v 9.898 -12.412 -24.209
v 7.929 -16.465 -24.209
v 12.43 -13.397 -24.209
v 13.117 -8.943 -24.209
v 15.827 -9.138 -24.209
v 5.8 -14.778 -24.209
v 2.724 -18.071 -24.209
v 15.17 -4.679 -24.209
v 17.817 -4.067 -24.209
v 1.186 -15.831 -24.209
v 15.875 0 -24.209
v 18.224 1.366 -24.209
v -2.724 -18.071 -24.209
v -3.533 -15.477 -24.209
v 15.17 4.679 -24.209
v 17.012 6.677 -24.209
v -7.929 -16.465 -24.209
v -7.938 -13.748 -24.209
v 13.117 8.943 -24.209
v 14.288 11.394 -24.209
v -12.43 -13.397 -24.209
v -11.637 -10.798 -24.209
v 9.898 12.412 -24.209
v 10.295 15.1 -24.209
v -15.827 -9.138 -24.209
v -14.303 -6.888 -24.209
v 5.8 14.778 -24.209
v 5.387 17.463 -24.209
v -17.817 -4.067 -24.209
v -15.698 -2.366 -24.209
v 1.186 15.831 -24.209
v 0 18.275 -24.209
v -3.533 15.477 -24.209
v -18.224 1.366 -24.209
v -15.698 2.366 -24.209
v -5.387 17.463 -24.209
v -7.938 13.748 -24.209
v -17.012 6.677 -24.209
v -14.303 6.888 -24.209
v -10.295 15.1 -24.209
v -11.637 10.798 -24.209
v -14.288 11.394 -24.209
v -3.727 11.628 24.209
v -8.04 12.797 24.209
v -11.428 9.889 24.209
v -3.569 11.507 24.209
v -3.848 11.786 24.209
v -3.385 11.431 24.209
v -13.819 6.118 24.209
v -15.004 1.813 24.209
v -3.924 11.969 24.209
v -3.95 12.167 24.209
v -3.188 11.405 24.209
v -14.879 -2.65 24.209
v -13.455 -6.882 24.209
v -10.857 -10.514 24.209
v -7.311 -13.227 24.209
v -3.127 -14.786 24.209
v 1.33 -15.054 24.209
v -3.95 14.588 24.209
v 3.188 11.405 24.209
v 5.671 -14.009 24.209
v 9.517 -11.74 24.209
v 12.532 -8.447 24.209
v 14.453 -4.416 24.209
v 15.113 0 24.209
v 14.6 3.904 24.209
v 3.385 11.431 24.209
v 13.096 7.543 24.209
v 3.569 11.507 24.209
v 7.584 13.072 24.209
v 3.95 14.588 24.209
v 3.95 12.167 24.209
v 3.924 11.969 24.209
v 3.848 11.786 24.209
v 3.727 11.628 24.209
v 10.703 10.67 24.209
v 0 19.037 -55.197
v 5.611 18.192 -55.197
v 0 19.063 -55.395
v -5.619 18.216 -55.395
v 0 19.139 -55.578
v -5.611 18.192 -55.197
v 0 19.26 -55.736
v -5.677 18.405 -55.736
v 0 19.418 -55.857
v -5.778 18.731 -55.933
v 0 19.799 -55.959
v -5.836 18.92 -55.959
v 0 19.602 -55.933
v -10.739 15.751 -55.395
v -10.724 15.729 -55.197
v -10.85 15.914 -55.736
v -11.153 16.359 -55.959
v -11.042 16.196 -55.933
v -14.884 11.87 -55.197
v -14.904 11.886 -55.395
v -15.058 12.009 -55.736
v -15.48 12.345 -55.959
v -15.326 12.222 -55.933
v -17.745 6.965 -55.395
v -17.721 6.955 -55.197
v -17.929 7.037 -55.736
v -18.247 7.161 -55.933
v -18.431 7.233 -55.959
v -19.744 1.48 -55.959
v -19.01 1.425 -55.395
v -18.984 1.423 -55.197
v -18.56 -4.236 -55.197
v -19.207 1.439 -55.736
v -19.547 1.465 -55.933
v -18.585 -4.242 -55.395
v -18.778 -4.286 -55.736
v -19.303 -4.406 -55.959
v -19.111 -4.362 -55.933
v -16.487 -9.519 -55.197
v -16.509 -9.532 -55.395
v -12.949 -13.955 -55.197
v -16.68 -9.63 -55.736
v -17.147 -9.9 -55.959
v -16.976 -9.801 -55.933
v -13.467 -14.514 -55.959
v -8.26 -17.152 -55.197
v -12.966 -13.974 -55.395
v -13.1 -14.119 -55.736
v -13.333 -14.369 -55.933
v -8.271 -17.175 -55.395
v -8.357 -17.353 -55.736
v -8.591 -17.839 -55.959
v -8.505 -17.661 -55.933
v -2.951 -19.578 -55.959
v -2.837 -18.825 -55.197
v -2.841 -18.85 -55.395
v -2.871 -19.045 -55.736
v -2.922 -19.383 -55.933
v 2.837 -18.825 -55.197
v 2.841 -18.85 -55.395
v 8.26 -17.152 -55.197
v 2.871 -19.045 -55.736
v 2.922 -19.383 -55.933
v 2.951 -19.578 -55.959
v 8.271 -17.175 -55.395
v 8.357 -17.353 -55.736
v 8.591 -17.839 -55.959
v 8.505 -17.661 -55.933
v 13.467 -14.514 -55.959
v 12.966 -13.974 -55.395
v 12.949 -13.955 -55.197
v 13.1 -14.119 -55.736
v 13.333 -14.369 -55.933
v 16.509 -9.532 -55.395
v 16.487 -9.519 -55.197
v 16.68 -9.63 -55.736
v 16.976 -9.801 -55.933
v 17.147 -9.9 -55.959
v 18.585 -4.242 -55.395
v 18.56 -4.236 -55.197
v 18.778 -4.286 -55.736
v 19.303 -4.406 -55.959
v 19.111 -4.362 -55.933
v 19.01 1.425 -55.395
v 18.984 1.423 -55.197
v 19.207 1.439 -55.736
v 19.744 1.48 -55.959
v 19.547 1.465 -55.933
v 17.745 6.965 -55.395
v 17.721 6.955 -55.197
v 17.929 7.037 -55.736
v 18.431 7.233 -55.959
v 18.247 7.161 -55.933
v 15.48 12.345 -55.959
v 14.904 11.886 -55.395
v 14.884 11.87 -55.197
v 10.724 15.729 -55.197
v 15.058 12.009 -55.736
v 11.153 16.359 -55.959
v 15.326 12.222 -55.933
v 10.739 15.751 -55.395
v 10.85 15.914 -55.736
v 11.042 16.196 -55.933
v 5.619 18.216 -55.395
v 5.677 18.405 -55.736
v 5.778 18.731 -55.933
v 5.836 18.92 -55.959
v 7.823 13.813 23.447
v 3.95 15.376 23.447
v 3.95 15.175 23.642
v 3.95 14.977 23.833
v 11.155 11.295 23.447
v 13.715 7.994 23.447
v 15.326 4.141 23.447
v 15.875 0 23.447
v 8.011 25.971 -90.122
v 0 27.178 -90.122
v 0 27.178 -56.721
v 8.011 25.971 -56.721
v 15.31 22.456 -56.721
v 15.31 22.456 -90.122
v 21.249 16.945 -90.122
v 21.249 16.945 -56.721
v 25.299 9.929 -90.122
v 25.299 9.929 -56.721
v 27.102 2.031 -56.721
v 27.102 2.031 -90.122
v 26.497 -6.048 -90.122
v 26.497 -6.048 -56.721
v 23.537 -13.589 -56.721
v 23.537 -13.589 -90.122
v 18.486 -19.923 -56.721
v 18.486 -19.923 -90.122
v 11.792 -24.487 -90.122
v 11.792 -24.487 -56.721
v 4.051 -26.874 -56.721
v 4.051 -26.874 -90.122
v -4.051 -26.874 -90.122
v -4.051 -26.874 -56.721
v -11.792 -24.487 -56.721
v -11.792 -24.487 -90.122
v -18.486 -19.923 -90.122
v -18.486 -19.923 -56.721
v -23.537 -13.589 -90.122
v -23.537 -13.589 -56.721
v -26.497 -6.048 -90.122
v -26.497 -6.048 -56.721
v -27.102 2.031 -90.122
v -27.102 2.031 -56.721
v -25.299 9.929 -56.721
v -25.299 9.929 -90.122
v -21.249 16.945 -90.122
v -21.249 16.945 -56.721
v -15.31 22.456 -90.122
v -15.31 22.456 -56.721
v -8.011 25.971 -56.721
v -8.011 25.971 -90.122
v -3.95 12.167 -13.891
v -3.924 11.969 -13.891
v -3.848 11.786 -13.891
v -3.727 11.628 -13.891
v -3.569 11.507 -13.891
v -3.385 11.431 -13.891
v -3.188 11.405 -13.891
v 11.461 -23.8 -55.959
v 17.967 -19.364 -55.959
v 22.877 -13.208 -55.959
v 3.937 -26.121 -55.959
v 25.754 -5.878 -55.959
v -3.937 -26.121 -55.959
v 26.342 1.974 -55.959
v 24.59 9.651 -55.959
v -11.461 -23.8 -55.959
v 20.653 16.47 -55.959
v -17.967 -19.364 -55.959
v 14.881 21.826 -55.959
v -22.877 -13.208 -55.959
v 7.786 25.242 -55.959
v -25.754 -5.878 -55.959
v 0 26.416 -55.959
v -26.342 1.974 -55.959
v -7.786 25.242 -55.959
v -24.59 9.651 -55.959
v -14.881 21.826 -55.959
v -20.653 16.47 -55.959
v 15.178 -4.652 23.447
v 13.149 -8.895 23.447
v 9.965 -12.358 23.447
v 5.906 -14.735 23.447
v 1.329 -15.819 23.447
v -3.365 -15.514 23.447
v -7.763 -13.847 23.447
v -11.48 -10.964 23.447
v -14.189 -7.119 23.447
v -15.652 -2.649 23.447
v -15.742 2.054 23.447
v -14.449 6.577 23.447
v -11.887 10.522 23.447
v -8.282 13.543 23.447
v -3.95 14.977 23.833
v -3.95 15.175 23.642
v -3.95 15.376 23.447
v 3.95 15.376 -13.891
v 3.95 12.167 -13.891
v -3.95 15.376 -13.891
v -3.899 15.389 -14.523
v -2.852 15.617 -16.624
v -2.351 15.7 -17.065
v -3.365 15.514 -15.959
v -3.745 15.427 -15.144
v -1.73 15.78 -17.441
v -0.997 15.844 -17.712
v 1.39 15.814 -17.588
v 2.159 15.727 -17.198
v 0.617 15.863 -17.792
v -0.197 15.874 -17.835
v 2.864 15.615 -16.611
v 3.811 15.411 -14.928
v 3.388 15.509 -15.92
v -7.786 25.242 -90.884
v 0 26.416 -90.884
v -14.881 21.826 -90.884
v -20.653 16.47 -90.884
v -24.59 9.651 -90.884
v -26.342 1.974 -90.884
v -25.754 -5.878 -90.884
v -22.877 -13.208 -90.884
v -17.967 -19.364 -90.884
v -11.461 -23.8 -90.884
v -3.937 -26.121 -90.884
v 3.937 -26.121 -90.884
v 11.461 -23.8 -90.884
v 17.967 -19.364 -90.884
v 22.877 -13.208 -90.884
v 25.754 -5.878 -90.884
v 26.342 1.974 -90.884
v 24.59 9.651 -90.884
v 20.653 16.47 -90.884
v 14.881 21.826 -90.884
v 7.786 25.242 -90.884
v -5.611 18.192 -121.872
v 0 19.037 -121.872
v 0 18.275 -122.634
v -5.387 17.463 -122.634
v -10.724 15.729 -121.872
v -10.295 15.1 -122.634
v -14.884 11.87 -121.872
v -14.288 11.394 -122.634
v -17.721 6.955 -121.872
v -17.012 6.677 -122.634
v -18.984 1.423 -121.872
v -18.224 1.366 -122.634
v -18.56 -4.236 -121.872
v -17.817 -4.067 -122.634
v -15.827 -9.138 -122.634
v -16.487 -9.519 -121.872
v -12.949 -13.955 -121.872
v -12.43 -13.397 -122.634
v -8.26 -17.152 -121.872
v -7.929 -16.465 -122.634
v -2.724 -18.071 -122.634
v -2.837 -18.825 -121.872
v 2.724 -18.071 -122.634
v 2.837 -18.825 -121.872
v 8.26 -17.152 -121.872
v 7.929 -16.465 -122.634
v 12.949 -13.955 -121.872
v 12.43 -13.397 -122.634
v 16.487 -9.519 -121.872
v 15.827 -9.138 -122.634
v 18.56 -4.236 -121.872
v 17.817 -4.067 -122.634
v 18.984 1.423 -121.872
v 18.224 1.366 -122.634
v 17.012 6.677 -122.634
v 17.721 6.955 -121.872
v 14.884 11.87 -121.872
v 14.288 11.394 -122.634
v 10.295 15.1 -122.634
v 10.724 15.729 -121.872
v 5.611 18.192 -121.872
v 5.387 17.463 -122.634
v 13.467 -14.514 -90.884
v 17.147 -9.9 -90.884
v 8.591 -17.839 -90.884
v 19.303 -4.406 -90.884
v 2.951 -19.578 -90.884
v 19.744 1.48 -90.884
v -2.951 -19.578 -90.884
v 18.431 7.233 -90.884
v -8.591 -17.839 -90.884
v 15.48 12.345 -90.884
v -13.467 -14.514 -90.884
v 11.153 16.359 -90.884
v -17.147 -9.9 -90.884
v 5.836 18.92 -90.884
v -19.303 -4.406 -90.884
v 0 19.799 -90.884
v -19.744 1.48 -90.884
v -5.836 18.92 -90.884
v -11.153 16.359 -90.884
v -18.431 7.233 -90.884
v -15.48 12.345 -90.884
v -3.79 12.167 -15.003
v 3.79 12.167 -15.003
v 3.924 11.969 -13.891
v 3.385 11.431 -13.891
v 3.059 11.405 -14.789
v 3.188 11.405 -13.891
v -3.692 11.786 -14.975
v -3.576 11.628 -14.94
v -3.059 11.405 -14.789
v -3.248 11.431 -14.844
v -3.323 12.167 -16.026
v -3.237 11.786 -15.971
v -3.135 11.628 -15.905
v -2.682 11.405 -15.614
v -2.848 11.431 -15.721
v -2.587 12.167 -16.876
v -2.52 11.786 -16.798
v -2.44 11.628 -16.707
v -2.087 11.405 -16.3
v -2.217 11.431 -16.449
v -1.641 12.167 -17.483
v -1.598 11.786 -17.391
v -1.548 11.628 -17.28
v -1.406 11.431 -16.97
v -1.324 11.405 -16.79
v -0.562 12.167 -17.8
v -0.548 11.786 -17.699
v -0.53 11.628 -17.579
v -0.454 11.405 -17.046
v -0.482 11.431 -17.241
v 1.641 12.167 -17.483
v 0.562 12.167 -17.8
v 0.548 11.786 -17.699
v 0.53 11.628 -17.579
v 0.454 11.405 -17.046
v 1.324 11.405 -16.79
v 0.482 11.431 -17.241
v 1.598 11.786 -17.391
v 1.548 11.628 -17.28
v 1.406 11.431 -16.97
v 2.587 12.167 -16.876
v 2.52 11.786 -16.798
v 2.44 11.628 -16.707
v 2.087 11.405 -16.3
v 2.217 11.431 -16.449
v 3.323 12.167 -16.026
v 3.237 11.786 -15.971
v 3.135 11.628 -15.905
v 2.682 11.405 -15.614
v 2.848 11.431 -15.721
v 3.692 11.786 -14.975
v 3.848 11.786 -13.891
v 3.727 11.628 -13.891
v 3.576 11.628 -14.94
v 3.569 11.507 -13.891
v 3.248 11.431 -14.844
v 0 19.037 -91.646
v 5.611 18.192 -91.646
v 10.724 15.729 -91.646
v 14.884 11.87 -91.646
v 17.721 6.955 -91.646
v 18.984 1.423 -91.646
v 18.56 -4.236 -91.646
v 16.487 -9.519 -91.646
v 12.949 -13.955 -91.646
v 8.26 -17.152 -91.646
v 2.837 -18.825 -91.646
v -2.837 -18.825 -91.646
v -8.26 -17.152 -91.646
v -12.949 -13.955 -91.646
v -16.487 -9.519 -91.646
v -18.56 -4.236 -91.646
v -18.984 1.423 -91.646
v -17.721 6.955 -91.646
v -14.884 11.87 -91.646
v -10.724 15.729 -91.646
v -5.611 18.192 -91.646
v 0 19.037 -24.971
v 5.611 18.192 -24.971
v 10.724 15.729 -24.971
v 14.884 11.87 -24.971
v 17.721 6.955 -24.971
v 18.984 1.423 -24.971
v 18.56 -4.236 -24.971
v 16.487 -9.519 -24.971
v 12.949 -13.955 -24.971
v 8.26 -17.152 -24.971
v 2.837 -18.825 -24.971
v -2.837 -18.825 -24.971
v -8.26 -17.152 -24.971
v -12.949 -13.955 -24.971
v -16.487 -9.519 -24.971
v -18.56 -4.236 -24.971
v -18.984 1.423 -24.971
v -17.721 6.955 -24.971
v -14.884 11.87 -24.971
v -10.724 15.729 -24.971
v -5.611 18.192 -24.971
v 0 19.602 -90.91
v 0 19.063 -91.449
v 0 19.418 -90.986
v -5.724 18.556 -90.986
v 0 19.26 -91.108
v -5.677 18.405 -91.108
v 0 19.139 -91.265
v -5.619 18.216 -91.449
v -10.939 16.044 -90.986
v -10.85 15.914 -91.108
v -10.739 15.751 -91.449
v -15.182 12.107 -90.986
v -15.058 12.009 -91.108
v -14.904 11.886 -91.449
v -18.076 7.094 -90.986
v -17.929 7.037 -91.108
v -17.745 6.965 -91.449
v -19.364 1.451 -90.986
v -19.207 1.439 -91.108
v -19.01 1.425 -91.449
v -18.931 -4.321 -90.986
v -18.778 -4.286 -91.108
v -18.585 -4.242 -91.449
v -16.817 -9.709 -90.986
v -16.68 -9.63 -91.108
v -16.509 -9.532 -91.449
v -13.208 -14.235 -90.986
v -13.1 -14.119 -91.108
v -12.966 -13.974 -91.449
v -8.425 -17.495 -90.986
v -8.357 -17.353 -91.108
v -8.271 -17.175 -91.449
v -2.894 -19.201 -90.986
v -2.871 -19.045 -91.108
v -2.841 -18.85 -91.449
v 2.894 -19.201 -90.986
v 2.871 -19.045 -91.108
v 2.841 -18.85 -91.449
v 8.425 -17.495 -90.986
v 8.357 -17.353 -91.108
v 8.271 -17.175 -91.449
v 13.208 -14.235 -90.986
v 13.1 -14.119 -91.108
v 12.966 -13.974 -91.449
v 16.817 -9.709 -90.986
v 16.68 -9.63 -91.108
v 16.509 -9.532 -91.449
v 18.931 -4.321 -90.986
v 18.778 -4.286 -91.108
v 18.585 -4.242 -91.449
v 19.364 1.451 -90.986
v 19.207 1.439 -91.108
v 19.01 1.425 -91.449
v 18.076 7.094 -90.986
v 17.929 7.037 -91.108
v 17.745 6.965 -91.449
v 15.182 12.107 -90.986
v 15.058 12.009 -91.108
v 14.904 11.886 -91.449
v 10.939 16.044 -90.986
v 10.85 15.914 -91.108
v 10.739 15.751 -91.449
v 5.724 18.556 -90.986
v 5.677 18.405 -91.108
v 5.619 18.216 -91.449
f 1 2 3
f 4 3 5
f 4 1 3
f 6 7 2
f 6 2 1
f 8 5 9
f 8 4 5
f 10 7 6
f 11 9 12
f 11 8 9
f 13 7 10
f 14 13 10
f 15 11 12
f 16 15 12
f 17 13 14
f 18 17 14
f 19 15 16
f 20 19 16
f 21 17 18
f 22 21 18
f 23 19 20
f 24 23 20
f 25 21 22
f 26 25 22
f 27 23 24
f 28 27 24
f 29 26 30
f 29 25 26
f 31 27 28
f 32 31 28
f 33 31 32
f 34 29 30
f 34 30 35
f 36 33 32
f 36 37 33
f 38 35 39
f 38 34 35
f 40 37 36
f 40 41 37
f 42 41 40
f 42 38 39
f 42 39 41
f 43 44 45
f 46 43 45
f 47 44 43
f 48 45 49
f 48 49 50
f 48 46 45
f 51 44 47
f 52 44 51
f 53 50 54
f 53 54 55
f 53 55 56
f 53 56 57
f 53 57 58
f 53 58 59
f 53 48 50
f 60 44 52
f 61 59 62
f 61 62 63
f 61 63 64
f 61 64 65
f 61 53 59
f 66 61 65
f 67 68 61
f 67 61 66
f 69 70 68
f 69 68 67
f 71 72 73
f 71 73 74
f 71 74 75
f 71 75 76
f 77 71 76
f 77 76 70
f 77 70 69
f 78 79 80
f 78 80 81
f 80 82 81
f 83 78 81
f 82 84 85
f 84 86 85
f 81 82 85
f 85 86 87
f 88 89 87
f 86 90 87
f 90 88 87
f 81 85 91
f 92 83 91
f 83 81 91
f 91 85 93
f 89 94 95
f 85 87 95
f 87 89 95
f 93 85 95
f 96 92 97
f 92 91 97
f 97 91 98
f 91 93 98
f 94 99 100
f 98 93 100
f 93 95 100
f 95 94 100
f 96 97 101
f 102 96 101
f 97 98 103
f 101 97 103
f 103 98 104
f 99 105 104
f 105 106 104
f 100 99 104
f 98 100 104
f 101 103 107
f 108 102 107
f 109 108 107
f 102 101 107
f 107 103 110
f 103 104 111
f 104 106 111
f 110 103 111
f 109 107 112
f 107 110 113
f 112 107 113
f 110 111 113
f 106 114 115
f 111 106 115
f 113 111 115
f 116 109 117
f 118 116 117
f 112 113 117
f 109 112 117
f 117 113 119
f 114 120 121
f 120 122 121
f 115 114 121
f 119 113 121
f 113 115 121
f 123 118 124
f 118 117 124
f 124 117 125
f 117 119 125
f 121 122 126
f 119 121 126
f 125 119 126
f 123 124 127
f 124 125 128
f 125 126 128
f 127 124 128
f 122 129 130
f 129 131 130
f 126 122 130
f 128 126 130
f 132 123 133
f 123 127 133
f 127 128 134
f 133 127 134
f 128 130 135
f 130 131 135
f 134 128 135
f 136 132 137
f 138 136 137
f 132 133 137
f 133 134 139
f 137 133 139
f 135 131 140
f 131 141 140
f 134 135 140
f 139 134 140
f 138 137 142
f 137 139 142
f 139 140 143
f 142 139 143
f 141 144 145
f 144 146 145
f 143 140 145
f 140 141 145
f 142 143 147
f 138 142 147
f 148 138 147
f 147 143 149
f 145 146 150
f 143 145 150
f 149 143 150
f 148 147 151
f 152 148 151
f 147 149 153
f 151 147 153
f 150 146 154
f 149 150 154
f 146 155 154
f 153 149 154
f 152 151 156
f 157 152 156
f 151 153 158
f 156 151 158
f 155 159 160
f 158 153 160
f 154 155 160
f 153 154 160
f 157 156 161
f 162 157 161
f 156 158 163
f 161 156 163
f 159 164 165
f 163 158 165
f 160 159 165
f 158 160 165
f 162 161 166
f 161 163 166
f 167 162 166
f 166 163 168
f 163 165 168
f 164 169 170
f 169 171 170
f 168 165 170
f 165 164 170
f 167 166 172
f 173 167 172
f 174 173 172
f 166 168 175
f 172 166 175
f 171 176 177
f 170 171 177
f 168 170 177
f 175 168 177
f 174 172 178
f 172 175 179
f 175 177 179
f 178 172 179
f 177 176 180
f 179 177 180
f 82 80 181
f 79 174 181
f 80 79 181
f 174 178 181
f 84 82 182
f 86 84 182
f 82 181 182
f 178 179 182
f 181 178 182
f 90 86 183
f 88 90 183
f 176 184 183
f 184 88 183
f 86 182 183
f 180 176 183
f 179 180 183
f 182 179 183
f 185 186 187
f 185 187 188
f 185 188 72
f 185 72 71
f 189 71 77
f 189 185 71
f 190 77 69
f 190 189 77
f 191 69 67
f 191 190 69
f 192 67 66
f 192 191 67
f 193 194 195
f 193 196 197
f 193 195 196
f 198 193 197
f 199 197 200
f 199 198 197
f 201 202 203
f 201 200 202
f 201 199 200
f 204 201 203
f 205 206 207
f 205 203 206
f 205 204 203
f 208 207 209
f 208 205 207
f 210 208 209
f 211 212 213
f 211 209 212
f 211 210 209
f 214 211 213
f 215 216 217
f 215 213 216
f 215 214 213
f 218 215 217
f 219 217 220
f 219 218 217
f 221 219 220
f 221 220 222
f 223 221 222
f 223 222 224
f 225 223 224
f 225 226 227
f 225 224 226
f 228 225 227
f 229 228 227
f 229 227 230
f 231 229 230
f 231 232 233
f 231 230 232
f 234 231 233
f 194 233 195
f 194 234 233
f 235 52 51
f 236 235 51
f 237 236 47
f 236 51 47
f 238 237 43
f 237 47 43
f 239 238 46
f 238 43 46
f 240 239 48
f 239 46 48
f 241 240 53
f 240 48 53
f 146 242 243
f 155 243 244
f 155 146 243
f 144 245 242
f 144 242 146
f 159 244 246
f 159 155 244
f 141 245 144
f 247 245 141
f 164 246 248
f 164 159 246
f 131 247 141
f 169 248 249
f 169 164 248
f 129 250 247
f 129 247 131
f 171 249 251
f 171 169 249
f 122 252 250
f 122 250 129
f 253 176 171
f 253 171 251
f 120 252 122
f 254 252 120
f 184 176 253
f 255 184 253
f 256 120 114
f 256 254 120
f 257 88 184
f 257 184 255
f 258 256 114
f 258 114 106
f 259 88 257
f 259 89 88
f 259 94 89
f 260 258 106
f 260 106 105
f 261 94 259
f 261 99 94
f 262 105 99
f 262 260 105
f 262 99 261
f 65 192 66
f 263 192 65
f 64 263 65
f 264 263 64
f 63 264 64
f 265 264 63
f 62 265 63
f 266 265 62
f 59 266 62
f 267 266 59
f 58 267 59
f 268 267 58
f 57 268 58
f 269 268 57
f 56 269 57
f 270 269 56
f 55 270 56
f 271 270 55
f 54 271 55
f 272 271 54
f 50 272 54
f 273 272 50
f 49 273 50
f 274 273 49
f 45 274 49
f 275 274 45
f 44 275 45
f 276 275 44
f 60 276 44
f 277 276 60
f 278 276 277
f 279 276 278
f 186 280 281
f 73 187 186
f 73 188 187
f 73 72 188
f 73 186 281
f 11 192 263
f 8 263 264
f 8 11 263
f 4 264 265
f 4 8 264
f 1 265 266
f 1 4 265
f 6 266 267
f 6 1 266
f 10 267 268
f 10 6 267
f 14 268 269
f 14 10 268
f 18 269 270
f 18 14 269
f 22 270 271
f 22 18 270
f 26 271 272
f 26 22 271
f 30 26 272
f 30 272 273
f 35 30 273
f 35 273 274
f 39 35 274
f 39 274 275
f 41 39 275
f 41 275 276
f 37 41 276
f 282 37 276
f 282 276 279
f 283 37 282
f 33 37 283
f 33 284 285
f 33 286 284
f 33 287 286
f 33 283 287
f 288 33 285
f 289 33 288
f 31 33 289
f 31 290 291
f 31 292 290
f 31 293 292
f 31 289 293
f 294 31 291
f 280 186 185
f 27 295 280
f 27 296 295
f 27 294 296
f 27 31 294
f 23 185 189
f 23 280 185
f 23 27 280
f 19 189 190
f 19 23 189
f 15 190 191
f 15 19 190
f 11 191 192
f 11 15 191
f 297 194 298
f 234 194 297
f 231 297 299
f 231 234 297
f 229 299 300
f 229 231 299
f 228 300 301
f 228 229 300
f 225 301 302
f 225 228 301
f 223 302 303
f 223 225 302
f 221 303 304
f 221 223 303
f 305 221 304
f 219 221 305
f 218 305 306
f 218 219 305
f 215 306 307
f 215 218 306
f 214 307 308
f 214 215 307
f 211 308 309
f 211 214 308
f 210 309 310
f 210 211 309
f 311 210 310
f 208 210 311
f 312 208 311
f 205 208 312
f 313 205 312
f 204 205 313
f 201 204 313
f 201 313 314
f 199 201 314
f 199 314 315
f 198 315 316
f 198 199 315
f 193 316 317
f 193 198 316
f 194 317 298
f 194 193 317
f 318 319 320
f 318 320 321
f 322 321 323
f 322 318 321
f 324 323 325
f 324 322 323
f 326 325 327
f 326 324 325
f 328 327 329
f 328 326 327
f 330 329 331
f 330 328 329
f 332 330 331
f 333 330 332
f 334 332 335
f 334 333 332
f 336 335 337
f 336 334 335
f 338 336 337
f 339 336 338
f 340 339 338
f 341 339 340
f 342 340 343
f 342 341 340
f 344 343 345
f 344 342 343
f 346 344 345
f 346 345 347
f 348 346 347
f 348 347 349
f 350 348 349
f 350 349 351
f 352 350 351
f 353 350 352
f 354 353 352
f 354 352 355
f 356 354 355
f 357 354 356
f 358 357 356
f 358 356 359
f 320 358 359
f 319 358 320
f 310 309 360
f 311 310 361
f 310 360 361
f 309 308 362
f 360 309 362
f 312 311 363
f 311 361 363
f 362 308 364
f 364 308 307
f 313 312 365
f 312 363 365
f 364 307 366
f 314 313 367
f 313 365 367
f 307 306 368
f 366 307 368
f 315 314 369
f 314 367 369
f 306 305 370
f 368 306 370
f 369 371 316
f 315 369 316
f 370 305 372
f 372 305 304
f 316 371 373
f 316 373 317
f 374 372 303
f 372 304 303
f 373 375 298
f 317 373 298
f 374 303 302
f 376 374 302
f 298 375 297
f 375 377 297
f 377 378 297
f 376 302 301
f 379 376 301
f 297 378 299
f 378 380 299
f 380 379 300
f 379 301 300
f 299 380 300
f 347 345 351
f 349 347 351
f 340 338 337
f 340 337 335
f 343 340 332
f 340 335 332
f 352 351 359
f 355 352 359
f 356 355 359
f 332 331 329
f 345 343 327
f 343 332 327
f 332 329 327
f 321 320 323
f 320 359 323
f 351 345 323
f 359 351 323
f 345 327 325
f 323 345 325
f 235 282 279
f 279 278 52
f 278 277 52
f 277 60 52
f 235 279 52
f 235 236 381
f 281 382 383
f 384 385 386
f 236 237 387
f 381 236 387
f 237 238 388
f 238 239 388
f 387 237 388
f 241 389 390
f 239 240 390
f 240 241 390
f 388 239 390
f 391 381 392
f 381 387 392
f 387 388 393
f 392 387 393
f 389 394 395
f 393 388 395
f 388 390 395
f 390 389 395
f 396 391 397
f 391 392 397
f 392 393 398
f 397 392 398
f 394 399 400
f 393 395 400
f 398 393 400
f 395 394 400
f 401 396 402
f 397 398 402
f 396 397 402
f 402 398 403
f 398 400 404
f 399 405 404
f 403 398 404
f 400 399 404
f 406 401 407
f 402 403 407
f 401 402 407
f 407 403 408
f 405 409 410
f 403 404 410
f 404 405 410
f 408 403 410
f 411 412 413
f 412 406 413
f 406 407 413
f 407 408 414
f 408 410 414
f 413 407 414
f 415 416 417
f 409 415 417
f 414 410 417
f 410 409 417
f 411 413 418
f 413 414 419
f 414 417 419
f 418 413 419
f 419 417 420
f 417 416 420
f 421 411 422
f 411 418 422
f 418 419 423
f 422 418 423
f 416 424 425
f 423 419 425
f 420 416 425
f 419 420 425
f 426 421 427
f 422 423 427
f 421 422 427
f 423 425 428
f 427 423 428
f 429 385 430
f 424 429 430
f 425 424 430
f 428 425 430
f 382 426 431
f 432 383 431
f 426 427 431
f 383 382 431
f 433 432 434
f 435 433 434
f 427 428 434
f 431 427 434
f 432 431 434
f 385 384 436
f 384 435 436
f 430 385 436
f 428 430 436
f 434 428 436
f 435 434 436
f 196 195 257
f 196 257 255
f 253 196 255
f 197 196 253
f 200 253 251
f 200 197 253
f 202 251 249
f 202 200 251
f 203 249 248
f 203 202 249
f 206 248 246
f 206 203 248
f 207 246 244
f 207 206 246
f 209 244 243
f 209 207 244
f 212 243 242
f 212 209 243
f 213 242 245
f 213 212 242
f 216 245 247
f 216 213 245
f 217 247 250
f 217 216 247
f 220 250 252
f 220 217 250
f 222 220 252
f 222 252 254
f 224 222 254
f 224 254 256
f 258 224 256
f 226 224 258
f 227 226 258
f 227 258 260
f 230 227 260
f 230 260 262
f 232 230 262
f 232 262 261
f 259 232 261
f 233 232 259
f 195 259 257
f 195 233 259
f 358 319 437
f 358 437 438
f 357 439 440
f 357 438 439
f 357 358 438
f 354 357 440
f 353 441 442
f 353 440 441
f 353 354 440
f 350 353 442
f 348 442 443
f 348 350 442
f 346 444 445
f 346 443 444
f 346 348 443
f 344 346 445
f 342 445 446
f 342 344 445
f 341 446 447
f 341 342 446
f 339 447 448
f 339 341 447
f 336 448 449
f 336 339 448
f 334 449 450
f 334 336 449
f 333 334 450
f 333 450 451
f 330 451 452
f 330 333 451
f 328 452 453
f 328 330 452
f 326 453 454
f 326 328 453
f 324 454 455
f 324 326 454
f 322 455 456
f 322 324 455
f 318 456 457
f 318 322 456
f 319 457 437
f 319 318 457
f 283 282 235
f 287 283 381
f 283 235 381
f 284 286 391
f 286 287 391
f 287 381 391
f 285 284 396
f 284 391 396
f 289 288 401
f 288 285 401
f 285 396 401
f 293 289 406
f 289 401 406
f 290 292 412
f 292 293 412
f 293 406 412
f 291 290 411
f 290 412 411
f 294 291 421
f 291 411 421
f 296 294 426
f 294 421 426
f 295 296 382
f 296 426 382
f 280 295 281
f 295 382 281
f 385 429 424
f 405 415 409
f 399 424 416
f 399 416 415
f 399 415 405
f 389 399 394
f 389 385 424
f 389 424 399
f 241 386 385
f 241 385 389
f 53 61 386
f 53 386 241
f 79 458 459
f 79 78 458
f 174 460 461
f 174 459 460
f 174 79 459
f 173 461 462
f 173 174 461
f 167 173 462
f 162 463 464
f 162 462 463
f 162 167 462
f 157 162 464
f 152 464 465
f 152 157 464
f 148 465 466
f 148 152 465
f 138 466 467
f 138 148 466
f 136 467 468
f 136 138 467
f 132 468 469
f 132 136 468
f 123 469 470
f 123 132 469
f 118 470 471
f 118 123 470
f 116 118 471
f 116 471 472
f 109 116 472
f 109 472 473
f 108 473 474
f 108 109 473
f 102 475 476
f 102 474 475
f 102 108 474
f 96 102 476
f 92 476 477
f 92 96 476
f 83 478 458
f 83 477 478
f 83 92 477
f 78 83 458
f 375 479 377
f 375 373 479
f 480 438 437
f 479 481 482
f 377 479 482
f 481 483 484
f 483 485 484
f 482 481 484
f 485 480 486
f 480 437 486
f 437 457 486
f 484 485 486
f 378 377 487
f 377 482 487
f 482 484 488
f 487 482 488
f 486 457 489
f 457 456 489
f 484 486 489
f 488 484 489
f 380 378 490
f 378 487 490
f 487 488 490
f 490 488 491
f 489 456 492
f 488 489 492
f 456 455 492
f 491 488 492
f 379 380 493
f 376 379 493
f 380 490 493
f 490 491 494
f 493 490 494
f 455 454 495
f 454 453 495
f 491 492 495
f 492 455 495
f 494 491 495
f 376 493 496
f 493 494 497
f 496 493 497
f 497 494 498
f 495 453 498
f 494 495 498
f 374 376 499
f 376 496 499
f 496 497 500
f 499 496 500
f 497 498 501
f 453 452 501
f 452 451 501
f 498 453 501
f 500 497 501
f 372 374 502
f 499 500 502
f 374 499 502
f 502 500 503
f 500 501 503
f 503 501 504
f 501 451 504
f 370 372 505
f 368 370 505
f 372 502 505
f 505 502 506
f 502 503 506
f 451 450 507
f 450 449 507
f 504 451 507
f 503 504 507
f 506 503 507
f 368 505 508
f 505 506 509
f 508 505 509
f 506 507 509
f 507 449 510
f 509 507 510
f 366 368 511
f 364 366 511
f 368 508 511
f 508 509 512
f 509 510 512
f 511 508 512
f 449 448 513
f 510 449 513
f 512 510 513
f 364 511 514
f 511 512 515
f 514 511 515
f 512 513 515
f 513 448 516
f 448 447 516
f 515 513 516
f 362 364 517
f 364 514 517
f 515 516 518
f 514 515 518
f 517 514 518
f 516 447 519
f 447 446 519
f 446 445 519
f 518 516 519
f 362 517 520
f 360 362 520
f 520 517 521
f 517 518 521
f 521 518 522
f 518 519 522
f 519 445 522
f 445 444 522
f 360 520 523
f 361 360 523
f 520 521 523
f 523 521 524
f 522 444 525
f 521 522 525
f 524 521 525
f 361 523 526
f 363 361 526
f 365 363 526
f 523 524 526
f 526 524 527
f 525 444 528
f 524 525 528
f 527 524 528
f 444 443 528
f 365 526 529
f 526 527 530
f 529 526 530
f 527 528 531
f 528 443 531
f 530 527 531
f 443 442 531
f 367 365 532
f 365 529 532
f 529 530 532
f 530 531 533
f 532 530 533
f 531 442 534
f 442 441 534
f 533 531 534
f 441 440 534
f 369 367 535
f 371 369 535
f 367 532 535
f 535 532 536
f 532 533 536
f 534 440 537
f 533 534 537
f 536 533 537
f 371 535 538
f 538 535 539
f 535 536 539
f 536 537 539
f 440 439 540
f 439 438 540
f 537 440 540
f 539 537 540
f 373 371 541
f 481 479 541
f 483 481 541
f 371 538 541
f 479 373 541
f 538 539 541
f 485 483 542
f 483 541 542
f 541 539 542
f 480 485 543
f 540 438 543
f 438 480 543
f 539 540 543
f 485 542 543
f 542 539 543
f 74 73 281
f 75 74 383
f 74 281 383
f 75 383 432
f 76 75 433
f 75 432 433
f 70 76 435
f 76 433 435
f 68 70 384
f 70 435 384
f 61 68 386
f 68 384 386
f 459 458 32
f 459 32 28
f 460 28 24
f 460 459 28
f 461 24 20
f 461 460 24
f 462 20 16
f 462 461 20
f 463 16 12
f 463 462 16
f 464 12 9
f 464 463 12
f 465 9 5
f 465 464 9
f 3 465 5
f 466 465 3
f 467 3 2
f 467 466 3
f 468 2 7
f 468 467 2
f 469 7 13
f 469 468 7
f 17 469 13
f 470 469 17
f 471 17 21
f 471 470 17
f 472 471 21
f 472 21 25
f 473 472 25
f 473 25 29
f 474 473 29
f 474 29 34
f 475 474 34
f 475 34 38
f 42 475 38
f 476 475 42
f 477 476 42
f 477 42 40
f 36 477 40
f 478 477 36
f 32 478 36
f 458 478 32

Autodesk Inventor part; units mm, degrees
sketch "Sketch1" plane through (0, 0, 0) normal (0, 0, 1) x (1, 0, 0)
  line L0 (0, -22.225) -> (0, 22.225) construction
  line L1 (-22.225, 0) -> (22.225, 0) construction
  circle A0 centre (0, 0) radius 15.875
  dimension "d0" = 31.75
extrude "Extrusion1" add sketch "Sketch1" along normal mid plane 48.4188
sketch "Sketch2" plane through (0, 0, 24.2094) normal (0, 0, 1) x (1, 0, 0)
  line L0 (0, -22.2499) -> (0, 22.3742) construction
  line L1 (-22.225, 0) -> (22.225, 0) construction
  line L2 (3.9497, 15.3758) -> (3.9497, 12.1666)
  line L3 (0, 11.4046) -> (3.1877, 11.4046)
  arc A0 (3.1877, 11.4046) -> (3.9497, 12.1666) centre (3.1877, 12.1666) ccw construction
  arc A1 (3.9497, 15.3758) -> (0, 15.875) centre (0, 0) ccw
  line L4 (-3.9497, 15.3758) -> (-3.9497, 12.1666)
  line L5 (0, 11.4046) -> (-3.1877, 11.4046)
  arc A2 (-3.9497, 12.1666) -> (-3.1877, 11.4046) centre (-3.1877, 12.1666) ccw construction
  arc A3 (0, 15.875) -> (-3.9497, 15.3758) centre (0, 0) ccw
  line L6 (-3.9497, 12.1666) -> (-3.9497, 11.4046)
  line L7 (-3.1877, 11.4046) -> (-3.9497, 11.4046)
  line L8 (3.9497, 12.1666) -> (3.9497, 11.4046)
  line L9 (3.1877, 11.4046) -> (3.9497, 11.4046)
  point P0 (0, -15.875)
  dimension "d4" = 3.9497
  dimension "d5" = 27.2796
  dimension "d6" = 1.524
  dimension "d7" = 15.875
  dimension "d8" = 15.875
extrude "Extrusion2" cut sketch "Sketch2" against normal blind 38.1
sketch "Sketch5" plane through (-3.9497, 11.4046, 24.2094) normal (0, 1, 0) x (1, 0, 0)
  line L0 (7.8994, 38.1) -> (0, 38.1) projected
  line L1 (0, 0) -> (0, 38.1) construction
  line L2 (7.8994, 38.1) -> (7.8994, 0) construction
  arc A0 (7.8994, 38.1) -> (0, 38.1) centre (3.9497, 38.1) ccw
extrude "Extrusion4" cut sketch "Sketch5" along normal up to surface
fillet "Fillet1" radius 0.762 3 edges at (0, 11.4046, -17.8403) (3.9497, 11.4046, 5.1594) (-3.9497, 11.4046, 5.1594)
sketch "Sketch3" plane through (0, 0, -24.2094) normal (0, 0, -1) x (-1, 0, 0)
  circle A0 centre (0, 0) radius 15.875 projected
extrude "Extrusion3" add sketch "Sketch3" along normal blind 98.425
sketch "Sketch4" plane through (0, 0, 0) normal (1, 0, 0) x (0, 1, 0)
  line L0 (27.178, -56.7214) -> (27.178, -90.1224)
  line L1 (0, -147.2946) -> (0, 24.5491) construction
  line L2 (-24.4856, 0) -> (35.7886, 0) construction
  line L3 (15.875, -122.6344) -> (15.875, -17.8403) construction
  line L4 (15.875, -122.6344) -> (-15.875, -122.6344) construction
  line L5 (18.2753, -24.2094) -> (15.875, -24.2094)
  line L6 (26.416, -55.9594) -> (19.7993, -55.9594)
  line L7 (26.416, -90.8844) -> (19.7993, -90.8844)
  line L8 (15.875, -122.6344) -> (18.2753, -122.6344)
  line L9 (19.0373, -24.9714) -> (19.0373, -55.1974)
  line L10 (19.0373, -91.6464) -> (19.0373, -121.8724)
  line L11 (15.875, -24.2094) -> (15.875, -122.6344)
  arc A0 (19.0373, -55.1974) -> (19.7993, -55.9594) centre (19.7993, -55.1974) ccw
  arc A1 (19.7993, -90.8844) -> (19.0373, -91.6464) centre (19.7993, -91.6464) ccw
  line L12 (27.178, -56.7214) -> (26.416, -55.9594)
  line L13 (27.178, -90.1224) -> (26.416, -90.8844)
  line L14 (19.0373, -24.9714) -> (18.2753, -24.2094)
  line L15 (19.0373, -121.8724) -> (18.2753, -122.6344)
  point P0 (0, 0)
  point P1 (27.178, -55.9594)
  point P2 (27.178, -90.8844)
  point P3 (19.0373, -24.2094)
  point P4 (19.0373, -122.6344)
  dimension "d19" = 27.178
  dimension "d20" = 98.425
  dimension "d22" = 34.925
  dimension "d23" = 31.75
  dimension "d24" = 19.0373
  dimension "d25" = 0.762
  dimension "d26" = 0.762
  dimension "d27" = 0.762
  dimension "d28" = 0.762
  dimension "d29" = 0.762
  dimension "d30" = 0.762
  dimension "d31" = 0.762
  dimension "d32" = 0.762
  dimension "d33" = 0.762
  dimension "d34" = 0.762
revolve "Revolution1" add sketch "Sketch4" angle 360 about axis through (0, 0, -10) along (0, 0, 1)
chamfer "Chamfer1" distance 0.762 angle 45 2 edges at (-9.7292, -12.5443, 24.2094) (12.5443, 9.7292, 24.2094)
ref_plane "WP_H" through (0, 0, 0) normal (0, -1, 0) x (1, 0, 0)
ref_plane "WP_End" through (0, 0, -73.4219) normal (0, 0, -1) x (-1, 0, 0)
equation "\"d0\" = K_"
equation "\"d1\" = L_"
equation "\"d4\" = 0.5 * M_"
equation "\"d5\" = N_"
equation "\"d7\" = 0.5 * K_"
equation "\"d8\" = 0.5 * K_"
equation "\"d9\" = O_"
equation "\"d28\" = d27"
equation "\"d29\" = d27"
equation "\"d30\" = d29"
equation "\"d32\" = d31"
equation "\"d33\" = d31"
equation "\"d34\" = d33"
equation "\"K_\" = 31.75"
equation "\"L_\" = 48.41875"
equation "\"N_\" = 27.2796"
equation "\"O_\" = 38.1"
equation "\"M_\" = 7.8994"
equation "\"d3\" = K_"
properties part number "ShaftConfig_B_3.7_7.5.FDA658ECE0FAA460A03A372F46ED1B09"
